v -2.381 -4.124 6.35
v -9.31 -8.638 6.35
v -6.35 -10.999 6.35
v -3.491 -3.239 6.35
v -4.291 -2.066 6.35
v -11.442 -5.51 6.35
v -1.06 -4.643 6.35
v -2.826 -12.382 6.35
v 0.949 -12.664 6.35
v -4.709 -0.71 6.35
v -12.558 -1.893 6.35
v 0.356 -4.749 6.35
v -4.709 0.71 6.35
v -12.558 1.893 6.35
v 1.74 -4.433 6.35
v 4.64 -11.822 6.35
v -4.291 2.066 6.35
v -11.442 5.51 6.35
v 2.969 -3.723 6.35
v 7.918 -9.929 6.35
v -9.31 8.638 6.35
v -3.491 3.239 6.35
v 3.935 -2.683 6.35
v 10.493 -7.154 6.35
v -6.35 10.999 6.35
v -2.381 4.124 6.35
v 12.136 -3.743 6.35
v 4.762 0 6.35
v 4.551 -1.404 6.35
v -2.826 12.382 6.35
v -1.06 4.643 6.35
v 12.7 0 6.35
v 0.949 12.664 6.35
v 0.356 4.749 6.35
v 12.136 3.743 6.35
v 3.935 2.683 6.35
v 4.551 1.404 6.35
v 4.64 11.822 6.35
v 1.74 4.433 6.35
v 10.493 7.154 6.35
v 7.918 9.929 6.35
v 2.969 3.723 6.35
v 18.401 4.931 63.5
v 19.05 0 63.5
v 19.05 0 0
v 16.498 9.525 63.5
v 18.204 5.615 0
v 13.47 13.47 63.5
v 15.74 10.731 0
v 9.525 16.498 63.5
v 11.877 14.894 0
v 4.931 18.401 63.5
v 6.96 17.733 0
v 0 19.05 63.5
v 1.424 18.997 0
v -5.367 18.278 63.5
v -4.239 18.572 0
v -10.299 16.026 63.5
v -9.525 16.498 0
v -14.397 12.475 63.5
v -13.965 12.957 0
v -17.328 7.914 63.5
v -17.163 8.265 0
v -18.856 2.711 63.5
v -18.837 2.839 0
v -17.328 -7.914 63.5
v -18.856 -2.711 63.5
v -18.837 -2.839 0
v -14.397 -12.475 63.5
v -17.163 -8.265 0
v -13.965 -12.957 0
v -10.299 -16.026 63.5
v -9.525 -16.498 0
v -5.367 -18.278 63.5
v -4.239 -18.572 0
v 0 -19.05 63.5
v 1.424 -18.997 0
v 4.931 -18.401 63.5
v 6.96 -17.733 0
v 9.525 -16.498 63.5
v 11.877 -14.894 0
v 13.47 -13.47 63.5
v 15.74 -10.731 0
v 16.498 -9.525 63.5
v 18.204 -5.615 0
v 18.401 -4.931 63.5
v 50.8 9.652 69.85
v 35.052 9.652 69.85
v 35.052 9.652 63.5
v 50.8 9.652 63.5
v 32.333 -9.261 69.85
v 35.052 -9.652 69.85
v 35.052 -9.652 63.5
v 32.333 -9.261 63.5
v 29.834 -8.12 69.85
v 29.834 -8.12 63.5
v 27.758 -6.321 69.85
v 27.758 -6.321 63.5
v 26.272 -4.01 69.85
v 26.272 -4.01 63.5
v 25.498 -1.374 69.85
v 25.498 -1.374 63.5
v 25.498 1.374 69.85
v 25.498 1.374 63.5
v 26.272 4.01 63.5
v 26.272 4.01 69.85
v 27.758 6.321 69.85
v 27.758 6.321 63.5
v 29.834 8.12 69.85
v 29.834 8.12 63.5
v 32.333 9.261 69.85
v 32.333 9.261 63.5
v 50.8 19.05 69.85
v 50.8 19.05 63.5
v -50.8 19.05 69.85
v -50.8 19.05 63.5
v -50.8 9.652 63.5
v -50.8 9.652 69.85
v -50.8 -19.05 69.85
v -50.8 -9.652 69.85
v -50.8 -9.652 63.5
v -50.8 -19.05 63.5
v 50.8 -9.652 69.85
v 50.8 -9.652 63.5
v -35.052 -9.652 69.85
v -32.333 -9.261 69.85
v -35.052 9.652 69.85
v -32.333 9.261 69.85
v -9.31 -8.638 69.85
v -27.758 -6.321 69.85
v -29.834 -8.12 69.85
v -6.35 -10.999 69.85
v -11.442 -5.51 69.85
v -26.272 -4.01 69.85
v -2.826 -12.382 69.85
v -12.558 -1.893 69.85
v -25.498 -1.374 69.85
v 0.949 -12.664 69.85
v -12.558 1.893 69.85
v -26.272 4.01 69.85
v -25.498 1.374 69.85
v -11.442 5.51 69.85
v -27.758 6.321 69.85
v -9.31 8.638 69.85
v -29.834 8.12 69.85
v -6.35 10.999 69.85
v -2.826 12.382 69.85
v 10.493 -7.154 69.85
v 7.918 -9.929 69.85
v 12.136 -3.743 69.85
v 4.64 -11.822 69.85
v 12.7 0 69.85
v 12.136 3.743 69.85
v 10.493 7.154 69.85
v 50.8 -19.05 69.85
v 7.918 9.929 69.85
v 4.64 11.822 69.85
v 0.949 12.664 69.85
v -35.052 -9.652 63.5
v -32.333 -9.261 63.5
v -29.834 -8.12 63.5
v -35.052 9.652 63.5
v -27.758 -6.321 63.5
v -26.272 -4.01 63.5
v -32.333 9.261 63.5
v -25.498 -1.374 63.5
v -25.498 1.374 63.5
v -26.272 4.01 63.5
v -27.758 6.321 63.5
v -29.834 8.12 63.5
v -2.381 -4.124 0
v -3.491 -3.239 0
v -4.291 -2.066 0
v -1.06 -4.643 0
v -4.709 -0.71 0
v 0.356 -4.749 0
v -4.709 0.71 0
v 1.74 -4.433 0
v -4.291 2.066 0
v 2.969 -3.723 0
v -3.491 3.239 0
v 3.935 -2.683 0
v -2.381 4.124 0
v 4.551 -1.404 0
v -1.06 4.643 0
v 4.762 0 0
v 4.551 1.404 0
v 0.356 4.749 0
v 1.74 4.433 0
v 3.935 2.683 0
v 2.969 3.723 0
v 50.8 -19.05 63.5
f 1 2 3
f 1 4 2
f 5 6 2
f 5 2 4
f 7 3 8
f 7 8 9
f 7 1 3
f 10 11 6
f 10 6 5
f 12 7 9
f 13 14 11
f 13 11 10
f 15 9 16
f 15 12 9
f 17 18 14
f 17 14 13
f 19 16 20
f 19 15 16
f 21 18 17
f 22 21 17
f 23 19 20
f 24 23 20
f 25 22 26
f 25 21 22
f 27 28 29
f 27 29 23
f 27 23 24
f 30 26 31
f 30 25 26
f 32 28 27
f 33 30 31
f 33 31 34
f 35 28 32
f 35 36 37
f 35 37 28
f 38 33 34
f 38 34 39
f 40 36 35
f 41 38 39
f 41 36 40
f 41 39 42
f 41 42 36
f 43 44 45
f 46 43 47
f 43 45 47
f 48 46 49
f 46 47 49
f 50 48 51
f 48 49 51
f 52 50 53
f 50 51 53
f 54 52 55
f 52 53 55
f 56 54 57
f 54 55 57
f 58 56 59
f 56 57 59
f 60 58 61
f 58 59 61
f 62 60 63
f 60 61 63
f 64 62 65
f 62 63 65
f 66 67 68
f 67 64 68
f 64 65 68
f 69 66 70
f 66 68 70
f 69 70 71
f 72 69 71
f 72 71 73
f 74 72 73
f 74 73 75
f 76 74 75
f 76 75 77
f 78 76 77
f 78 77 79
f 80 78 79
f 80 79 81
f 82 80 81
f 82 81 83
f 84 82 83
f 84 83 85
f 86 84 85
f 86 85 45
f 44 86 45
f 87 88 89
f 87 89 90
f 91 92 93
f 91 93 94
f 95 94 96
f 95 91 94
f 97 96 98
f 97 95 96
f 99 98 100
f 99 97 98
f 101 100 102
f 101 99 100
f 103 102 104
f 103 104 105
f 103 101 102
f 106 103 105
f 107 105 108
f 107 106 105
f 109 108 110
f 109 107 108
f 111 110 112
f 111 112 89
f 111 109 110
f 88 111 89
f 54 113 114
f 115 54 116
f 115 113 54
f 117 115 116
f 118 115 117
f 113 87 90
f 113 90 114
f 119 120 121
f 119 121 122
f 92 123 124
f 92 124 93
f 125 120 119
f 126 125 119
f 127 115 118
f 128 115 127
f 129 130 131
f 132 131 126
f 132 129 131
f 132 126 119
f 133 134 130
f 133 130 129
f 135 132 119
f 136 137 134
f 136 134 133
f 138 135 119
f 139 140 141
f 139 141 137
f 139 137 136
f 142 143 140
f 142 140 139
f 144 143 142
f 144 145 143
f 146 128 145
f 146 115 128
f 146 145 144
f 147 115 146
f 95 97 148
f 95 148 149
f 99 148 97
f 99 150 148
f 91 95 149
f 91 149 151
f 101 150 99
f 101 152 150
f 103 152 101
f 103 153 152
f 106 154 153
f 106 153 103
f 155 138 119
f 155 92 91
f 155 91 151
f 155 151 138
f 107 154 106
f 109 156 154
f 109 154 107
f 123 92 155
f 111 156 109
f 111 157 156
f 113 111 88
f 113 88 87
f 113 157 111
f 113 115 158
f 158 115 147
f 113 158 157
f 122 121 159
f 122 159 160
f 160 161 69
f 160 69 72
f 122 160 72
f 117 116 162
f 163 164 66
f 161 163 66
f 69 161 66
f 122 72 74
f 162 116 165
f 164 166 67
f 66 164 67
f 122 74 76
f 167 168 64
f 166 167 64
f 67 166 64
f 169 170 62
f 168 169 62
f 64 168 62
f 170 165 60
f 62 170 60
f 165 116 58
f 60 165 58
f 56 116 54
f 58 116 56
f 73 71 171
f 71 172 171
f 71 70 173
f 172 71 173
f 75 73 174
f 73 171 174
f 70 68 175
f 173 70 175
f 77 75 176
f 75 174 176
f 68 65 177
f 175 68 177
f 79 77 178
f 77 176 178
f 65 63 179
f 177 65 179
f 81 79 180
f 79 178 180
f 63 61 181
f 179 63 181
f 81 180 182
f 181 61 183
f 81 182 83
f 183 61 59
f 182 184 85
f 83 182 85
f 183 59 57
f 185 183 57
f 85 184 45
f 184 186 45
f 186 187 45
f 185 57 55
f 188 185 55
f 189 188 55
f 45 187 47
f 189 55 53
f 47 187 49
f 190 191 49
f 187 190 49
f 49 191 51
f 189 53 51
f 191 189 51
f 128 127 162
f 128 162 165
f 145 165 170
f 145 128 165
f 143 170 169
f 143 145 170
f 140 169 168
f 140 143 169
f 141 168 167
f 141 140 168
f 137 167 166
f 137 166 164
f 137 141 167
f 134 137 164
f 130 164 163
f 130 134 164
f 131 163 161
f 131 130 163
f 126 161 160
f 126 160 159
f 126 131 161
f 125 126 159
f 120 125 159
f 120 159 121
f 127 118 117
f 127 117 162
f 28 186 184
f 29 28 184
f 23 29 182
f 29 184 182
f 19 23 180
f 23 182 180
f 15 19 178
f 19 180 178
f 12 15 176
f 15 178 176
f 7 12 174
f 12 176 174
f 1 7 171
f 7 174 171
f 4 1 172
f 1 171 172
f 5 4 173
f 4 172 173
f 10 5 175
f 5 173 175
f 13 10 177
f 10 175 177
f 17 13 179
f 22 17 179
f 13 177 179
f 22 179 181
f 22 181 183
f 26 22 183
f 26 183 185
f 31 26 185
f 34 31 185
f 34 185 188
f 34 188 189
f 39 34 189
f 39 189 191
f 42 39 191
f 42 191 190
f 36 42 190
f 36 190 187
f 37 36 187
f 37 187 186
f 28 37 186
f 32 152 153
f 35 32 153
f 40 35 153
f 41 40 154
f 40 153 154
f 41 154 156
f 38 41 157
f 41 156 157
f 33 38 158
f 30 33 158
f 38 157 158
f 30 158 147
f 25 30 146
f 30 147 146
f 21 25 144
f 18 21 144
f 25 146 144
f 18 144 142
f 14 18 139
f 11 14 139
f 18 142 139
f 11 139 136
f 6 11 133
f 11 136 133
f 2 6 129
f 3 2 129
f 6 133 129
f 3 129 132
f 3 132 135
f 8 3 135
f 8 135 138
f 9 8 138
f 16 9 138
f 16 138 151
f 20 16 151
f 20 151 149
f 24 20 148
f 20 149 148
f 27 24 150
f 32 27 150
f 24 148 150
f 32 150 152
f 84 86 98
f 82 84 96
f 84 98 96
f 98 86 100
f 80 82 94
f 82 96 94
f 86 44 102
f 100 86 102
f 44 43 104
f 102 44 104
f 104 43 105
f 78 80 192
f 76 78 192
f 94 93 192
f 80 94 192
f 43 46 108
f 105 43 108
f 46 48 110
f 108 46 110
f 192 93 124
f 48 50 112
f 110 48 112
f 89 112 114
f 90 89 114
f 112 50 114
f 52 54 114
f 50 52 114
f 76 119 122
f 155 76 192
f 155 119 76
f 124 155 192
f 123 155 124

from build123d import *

# Parameters (mm, degrees)
F0_R     = 19.05
F1_DEPTH = 69.85
F2_R     = 12.7
F3_DEPTH = 63.5
F5_DEPTH = 6.35
F6_R     = 4.7625
F7_DEPTH = 69.851


with BuildPart() as f1:
    # F0 (on Top) → F1 (new body)
    with BuildSketch(Plane.XY):
        Circle(F0_R)
    extrude(amount=F1_DEPTH)

    # F2 (on face) → F3 (cut)
    with BuildSketch(Plane.XY.offset(69.85)):
        Circle(F2_R)
    extrude(amount=-F3_DEPTH, mode=Mode.SUBTRACT)

    # F4 (on face) → F5 (join)
    with BuildSketch(Plane.XY.offset(69.85)):
        with BuildLine():
            Line((50.8, 19.05), (3.68e-08, 19.05))
            ThreePointArc((3.68e-08, 19.05), (13.4703841946, 13.4703841686), (19.05, 0))
            ThreePointArc((19.05, 0), (13.4703841946, -13.4703841686), (3.68e-08, -19.05))
            Line((3.68e-08, -19.05), (50.8, -19.05))
            Line((50.8, -19.05), (50.8, -9.652))
            Line((50.8, -9.652), (35.052, -9.652))
            ThreePointArc((35.052, -9.652), (25.4, 0), (35.052, 9.652))
            Line((35.052, 9.652), (50.8, 9.652))
            Line((50.8, 9.652), (50.8, 19.05))
        make_face()
        with BuildLine():
            Line((3.68e-08, 19.05), (-50.8, 19.05))
            Line((-50.8, 19.05), (-50.8, 9.652))
            Line((-50.8, 9.652), (-35.052, 9.652))
            ThreePointArc((-35.052, 9.652), (-25.4, 0), (-35.052, -9.652))
            Line((-35.052, -9.652), (-50.8, -9.652))
            Line((-50.8, -9.652), (-50.8, -19.05))
            Line((-50.8, -19.05), (3.68e-08, -19.05))
            ThreePointArc((3.68e-08, -19.05), (-19.05, 0), (3.68e-08, 19.05))
        make_face()
    extrude(amount=-F5_DEPTH)

    # F6 (on face) → F7 (cut, through all)
    with BuildSketch(Plane(origin=(0, 0, 0), x_dir=(1, 0, 0), z_dir=(0, 0, -1))):
        Circle(F6_R)
    extrude(amount=-F7_DEPTH, mode=Mode.SUBTRACT)


solid = f1.part
